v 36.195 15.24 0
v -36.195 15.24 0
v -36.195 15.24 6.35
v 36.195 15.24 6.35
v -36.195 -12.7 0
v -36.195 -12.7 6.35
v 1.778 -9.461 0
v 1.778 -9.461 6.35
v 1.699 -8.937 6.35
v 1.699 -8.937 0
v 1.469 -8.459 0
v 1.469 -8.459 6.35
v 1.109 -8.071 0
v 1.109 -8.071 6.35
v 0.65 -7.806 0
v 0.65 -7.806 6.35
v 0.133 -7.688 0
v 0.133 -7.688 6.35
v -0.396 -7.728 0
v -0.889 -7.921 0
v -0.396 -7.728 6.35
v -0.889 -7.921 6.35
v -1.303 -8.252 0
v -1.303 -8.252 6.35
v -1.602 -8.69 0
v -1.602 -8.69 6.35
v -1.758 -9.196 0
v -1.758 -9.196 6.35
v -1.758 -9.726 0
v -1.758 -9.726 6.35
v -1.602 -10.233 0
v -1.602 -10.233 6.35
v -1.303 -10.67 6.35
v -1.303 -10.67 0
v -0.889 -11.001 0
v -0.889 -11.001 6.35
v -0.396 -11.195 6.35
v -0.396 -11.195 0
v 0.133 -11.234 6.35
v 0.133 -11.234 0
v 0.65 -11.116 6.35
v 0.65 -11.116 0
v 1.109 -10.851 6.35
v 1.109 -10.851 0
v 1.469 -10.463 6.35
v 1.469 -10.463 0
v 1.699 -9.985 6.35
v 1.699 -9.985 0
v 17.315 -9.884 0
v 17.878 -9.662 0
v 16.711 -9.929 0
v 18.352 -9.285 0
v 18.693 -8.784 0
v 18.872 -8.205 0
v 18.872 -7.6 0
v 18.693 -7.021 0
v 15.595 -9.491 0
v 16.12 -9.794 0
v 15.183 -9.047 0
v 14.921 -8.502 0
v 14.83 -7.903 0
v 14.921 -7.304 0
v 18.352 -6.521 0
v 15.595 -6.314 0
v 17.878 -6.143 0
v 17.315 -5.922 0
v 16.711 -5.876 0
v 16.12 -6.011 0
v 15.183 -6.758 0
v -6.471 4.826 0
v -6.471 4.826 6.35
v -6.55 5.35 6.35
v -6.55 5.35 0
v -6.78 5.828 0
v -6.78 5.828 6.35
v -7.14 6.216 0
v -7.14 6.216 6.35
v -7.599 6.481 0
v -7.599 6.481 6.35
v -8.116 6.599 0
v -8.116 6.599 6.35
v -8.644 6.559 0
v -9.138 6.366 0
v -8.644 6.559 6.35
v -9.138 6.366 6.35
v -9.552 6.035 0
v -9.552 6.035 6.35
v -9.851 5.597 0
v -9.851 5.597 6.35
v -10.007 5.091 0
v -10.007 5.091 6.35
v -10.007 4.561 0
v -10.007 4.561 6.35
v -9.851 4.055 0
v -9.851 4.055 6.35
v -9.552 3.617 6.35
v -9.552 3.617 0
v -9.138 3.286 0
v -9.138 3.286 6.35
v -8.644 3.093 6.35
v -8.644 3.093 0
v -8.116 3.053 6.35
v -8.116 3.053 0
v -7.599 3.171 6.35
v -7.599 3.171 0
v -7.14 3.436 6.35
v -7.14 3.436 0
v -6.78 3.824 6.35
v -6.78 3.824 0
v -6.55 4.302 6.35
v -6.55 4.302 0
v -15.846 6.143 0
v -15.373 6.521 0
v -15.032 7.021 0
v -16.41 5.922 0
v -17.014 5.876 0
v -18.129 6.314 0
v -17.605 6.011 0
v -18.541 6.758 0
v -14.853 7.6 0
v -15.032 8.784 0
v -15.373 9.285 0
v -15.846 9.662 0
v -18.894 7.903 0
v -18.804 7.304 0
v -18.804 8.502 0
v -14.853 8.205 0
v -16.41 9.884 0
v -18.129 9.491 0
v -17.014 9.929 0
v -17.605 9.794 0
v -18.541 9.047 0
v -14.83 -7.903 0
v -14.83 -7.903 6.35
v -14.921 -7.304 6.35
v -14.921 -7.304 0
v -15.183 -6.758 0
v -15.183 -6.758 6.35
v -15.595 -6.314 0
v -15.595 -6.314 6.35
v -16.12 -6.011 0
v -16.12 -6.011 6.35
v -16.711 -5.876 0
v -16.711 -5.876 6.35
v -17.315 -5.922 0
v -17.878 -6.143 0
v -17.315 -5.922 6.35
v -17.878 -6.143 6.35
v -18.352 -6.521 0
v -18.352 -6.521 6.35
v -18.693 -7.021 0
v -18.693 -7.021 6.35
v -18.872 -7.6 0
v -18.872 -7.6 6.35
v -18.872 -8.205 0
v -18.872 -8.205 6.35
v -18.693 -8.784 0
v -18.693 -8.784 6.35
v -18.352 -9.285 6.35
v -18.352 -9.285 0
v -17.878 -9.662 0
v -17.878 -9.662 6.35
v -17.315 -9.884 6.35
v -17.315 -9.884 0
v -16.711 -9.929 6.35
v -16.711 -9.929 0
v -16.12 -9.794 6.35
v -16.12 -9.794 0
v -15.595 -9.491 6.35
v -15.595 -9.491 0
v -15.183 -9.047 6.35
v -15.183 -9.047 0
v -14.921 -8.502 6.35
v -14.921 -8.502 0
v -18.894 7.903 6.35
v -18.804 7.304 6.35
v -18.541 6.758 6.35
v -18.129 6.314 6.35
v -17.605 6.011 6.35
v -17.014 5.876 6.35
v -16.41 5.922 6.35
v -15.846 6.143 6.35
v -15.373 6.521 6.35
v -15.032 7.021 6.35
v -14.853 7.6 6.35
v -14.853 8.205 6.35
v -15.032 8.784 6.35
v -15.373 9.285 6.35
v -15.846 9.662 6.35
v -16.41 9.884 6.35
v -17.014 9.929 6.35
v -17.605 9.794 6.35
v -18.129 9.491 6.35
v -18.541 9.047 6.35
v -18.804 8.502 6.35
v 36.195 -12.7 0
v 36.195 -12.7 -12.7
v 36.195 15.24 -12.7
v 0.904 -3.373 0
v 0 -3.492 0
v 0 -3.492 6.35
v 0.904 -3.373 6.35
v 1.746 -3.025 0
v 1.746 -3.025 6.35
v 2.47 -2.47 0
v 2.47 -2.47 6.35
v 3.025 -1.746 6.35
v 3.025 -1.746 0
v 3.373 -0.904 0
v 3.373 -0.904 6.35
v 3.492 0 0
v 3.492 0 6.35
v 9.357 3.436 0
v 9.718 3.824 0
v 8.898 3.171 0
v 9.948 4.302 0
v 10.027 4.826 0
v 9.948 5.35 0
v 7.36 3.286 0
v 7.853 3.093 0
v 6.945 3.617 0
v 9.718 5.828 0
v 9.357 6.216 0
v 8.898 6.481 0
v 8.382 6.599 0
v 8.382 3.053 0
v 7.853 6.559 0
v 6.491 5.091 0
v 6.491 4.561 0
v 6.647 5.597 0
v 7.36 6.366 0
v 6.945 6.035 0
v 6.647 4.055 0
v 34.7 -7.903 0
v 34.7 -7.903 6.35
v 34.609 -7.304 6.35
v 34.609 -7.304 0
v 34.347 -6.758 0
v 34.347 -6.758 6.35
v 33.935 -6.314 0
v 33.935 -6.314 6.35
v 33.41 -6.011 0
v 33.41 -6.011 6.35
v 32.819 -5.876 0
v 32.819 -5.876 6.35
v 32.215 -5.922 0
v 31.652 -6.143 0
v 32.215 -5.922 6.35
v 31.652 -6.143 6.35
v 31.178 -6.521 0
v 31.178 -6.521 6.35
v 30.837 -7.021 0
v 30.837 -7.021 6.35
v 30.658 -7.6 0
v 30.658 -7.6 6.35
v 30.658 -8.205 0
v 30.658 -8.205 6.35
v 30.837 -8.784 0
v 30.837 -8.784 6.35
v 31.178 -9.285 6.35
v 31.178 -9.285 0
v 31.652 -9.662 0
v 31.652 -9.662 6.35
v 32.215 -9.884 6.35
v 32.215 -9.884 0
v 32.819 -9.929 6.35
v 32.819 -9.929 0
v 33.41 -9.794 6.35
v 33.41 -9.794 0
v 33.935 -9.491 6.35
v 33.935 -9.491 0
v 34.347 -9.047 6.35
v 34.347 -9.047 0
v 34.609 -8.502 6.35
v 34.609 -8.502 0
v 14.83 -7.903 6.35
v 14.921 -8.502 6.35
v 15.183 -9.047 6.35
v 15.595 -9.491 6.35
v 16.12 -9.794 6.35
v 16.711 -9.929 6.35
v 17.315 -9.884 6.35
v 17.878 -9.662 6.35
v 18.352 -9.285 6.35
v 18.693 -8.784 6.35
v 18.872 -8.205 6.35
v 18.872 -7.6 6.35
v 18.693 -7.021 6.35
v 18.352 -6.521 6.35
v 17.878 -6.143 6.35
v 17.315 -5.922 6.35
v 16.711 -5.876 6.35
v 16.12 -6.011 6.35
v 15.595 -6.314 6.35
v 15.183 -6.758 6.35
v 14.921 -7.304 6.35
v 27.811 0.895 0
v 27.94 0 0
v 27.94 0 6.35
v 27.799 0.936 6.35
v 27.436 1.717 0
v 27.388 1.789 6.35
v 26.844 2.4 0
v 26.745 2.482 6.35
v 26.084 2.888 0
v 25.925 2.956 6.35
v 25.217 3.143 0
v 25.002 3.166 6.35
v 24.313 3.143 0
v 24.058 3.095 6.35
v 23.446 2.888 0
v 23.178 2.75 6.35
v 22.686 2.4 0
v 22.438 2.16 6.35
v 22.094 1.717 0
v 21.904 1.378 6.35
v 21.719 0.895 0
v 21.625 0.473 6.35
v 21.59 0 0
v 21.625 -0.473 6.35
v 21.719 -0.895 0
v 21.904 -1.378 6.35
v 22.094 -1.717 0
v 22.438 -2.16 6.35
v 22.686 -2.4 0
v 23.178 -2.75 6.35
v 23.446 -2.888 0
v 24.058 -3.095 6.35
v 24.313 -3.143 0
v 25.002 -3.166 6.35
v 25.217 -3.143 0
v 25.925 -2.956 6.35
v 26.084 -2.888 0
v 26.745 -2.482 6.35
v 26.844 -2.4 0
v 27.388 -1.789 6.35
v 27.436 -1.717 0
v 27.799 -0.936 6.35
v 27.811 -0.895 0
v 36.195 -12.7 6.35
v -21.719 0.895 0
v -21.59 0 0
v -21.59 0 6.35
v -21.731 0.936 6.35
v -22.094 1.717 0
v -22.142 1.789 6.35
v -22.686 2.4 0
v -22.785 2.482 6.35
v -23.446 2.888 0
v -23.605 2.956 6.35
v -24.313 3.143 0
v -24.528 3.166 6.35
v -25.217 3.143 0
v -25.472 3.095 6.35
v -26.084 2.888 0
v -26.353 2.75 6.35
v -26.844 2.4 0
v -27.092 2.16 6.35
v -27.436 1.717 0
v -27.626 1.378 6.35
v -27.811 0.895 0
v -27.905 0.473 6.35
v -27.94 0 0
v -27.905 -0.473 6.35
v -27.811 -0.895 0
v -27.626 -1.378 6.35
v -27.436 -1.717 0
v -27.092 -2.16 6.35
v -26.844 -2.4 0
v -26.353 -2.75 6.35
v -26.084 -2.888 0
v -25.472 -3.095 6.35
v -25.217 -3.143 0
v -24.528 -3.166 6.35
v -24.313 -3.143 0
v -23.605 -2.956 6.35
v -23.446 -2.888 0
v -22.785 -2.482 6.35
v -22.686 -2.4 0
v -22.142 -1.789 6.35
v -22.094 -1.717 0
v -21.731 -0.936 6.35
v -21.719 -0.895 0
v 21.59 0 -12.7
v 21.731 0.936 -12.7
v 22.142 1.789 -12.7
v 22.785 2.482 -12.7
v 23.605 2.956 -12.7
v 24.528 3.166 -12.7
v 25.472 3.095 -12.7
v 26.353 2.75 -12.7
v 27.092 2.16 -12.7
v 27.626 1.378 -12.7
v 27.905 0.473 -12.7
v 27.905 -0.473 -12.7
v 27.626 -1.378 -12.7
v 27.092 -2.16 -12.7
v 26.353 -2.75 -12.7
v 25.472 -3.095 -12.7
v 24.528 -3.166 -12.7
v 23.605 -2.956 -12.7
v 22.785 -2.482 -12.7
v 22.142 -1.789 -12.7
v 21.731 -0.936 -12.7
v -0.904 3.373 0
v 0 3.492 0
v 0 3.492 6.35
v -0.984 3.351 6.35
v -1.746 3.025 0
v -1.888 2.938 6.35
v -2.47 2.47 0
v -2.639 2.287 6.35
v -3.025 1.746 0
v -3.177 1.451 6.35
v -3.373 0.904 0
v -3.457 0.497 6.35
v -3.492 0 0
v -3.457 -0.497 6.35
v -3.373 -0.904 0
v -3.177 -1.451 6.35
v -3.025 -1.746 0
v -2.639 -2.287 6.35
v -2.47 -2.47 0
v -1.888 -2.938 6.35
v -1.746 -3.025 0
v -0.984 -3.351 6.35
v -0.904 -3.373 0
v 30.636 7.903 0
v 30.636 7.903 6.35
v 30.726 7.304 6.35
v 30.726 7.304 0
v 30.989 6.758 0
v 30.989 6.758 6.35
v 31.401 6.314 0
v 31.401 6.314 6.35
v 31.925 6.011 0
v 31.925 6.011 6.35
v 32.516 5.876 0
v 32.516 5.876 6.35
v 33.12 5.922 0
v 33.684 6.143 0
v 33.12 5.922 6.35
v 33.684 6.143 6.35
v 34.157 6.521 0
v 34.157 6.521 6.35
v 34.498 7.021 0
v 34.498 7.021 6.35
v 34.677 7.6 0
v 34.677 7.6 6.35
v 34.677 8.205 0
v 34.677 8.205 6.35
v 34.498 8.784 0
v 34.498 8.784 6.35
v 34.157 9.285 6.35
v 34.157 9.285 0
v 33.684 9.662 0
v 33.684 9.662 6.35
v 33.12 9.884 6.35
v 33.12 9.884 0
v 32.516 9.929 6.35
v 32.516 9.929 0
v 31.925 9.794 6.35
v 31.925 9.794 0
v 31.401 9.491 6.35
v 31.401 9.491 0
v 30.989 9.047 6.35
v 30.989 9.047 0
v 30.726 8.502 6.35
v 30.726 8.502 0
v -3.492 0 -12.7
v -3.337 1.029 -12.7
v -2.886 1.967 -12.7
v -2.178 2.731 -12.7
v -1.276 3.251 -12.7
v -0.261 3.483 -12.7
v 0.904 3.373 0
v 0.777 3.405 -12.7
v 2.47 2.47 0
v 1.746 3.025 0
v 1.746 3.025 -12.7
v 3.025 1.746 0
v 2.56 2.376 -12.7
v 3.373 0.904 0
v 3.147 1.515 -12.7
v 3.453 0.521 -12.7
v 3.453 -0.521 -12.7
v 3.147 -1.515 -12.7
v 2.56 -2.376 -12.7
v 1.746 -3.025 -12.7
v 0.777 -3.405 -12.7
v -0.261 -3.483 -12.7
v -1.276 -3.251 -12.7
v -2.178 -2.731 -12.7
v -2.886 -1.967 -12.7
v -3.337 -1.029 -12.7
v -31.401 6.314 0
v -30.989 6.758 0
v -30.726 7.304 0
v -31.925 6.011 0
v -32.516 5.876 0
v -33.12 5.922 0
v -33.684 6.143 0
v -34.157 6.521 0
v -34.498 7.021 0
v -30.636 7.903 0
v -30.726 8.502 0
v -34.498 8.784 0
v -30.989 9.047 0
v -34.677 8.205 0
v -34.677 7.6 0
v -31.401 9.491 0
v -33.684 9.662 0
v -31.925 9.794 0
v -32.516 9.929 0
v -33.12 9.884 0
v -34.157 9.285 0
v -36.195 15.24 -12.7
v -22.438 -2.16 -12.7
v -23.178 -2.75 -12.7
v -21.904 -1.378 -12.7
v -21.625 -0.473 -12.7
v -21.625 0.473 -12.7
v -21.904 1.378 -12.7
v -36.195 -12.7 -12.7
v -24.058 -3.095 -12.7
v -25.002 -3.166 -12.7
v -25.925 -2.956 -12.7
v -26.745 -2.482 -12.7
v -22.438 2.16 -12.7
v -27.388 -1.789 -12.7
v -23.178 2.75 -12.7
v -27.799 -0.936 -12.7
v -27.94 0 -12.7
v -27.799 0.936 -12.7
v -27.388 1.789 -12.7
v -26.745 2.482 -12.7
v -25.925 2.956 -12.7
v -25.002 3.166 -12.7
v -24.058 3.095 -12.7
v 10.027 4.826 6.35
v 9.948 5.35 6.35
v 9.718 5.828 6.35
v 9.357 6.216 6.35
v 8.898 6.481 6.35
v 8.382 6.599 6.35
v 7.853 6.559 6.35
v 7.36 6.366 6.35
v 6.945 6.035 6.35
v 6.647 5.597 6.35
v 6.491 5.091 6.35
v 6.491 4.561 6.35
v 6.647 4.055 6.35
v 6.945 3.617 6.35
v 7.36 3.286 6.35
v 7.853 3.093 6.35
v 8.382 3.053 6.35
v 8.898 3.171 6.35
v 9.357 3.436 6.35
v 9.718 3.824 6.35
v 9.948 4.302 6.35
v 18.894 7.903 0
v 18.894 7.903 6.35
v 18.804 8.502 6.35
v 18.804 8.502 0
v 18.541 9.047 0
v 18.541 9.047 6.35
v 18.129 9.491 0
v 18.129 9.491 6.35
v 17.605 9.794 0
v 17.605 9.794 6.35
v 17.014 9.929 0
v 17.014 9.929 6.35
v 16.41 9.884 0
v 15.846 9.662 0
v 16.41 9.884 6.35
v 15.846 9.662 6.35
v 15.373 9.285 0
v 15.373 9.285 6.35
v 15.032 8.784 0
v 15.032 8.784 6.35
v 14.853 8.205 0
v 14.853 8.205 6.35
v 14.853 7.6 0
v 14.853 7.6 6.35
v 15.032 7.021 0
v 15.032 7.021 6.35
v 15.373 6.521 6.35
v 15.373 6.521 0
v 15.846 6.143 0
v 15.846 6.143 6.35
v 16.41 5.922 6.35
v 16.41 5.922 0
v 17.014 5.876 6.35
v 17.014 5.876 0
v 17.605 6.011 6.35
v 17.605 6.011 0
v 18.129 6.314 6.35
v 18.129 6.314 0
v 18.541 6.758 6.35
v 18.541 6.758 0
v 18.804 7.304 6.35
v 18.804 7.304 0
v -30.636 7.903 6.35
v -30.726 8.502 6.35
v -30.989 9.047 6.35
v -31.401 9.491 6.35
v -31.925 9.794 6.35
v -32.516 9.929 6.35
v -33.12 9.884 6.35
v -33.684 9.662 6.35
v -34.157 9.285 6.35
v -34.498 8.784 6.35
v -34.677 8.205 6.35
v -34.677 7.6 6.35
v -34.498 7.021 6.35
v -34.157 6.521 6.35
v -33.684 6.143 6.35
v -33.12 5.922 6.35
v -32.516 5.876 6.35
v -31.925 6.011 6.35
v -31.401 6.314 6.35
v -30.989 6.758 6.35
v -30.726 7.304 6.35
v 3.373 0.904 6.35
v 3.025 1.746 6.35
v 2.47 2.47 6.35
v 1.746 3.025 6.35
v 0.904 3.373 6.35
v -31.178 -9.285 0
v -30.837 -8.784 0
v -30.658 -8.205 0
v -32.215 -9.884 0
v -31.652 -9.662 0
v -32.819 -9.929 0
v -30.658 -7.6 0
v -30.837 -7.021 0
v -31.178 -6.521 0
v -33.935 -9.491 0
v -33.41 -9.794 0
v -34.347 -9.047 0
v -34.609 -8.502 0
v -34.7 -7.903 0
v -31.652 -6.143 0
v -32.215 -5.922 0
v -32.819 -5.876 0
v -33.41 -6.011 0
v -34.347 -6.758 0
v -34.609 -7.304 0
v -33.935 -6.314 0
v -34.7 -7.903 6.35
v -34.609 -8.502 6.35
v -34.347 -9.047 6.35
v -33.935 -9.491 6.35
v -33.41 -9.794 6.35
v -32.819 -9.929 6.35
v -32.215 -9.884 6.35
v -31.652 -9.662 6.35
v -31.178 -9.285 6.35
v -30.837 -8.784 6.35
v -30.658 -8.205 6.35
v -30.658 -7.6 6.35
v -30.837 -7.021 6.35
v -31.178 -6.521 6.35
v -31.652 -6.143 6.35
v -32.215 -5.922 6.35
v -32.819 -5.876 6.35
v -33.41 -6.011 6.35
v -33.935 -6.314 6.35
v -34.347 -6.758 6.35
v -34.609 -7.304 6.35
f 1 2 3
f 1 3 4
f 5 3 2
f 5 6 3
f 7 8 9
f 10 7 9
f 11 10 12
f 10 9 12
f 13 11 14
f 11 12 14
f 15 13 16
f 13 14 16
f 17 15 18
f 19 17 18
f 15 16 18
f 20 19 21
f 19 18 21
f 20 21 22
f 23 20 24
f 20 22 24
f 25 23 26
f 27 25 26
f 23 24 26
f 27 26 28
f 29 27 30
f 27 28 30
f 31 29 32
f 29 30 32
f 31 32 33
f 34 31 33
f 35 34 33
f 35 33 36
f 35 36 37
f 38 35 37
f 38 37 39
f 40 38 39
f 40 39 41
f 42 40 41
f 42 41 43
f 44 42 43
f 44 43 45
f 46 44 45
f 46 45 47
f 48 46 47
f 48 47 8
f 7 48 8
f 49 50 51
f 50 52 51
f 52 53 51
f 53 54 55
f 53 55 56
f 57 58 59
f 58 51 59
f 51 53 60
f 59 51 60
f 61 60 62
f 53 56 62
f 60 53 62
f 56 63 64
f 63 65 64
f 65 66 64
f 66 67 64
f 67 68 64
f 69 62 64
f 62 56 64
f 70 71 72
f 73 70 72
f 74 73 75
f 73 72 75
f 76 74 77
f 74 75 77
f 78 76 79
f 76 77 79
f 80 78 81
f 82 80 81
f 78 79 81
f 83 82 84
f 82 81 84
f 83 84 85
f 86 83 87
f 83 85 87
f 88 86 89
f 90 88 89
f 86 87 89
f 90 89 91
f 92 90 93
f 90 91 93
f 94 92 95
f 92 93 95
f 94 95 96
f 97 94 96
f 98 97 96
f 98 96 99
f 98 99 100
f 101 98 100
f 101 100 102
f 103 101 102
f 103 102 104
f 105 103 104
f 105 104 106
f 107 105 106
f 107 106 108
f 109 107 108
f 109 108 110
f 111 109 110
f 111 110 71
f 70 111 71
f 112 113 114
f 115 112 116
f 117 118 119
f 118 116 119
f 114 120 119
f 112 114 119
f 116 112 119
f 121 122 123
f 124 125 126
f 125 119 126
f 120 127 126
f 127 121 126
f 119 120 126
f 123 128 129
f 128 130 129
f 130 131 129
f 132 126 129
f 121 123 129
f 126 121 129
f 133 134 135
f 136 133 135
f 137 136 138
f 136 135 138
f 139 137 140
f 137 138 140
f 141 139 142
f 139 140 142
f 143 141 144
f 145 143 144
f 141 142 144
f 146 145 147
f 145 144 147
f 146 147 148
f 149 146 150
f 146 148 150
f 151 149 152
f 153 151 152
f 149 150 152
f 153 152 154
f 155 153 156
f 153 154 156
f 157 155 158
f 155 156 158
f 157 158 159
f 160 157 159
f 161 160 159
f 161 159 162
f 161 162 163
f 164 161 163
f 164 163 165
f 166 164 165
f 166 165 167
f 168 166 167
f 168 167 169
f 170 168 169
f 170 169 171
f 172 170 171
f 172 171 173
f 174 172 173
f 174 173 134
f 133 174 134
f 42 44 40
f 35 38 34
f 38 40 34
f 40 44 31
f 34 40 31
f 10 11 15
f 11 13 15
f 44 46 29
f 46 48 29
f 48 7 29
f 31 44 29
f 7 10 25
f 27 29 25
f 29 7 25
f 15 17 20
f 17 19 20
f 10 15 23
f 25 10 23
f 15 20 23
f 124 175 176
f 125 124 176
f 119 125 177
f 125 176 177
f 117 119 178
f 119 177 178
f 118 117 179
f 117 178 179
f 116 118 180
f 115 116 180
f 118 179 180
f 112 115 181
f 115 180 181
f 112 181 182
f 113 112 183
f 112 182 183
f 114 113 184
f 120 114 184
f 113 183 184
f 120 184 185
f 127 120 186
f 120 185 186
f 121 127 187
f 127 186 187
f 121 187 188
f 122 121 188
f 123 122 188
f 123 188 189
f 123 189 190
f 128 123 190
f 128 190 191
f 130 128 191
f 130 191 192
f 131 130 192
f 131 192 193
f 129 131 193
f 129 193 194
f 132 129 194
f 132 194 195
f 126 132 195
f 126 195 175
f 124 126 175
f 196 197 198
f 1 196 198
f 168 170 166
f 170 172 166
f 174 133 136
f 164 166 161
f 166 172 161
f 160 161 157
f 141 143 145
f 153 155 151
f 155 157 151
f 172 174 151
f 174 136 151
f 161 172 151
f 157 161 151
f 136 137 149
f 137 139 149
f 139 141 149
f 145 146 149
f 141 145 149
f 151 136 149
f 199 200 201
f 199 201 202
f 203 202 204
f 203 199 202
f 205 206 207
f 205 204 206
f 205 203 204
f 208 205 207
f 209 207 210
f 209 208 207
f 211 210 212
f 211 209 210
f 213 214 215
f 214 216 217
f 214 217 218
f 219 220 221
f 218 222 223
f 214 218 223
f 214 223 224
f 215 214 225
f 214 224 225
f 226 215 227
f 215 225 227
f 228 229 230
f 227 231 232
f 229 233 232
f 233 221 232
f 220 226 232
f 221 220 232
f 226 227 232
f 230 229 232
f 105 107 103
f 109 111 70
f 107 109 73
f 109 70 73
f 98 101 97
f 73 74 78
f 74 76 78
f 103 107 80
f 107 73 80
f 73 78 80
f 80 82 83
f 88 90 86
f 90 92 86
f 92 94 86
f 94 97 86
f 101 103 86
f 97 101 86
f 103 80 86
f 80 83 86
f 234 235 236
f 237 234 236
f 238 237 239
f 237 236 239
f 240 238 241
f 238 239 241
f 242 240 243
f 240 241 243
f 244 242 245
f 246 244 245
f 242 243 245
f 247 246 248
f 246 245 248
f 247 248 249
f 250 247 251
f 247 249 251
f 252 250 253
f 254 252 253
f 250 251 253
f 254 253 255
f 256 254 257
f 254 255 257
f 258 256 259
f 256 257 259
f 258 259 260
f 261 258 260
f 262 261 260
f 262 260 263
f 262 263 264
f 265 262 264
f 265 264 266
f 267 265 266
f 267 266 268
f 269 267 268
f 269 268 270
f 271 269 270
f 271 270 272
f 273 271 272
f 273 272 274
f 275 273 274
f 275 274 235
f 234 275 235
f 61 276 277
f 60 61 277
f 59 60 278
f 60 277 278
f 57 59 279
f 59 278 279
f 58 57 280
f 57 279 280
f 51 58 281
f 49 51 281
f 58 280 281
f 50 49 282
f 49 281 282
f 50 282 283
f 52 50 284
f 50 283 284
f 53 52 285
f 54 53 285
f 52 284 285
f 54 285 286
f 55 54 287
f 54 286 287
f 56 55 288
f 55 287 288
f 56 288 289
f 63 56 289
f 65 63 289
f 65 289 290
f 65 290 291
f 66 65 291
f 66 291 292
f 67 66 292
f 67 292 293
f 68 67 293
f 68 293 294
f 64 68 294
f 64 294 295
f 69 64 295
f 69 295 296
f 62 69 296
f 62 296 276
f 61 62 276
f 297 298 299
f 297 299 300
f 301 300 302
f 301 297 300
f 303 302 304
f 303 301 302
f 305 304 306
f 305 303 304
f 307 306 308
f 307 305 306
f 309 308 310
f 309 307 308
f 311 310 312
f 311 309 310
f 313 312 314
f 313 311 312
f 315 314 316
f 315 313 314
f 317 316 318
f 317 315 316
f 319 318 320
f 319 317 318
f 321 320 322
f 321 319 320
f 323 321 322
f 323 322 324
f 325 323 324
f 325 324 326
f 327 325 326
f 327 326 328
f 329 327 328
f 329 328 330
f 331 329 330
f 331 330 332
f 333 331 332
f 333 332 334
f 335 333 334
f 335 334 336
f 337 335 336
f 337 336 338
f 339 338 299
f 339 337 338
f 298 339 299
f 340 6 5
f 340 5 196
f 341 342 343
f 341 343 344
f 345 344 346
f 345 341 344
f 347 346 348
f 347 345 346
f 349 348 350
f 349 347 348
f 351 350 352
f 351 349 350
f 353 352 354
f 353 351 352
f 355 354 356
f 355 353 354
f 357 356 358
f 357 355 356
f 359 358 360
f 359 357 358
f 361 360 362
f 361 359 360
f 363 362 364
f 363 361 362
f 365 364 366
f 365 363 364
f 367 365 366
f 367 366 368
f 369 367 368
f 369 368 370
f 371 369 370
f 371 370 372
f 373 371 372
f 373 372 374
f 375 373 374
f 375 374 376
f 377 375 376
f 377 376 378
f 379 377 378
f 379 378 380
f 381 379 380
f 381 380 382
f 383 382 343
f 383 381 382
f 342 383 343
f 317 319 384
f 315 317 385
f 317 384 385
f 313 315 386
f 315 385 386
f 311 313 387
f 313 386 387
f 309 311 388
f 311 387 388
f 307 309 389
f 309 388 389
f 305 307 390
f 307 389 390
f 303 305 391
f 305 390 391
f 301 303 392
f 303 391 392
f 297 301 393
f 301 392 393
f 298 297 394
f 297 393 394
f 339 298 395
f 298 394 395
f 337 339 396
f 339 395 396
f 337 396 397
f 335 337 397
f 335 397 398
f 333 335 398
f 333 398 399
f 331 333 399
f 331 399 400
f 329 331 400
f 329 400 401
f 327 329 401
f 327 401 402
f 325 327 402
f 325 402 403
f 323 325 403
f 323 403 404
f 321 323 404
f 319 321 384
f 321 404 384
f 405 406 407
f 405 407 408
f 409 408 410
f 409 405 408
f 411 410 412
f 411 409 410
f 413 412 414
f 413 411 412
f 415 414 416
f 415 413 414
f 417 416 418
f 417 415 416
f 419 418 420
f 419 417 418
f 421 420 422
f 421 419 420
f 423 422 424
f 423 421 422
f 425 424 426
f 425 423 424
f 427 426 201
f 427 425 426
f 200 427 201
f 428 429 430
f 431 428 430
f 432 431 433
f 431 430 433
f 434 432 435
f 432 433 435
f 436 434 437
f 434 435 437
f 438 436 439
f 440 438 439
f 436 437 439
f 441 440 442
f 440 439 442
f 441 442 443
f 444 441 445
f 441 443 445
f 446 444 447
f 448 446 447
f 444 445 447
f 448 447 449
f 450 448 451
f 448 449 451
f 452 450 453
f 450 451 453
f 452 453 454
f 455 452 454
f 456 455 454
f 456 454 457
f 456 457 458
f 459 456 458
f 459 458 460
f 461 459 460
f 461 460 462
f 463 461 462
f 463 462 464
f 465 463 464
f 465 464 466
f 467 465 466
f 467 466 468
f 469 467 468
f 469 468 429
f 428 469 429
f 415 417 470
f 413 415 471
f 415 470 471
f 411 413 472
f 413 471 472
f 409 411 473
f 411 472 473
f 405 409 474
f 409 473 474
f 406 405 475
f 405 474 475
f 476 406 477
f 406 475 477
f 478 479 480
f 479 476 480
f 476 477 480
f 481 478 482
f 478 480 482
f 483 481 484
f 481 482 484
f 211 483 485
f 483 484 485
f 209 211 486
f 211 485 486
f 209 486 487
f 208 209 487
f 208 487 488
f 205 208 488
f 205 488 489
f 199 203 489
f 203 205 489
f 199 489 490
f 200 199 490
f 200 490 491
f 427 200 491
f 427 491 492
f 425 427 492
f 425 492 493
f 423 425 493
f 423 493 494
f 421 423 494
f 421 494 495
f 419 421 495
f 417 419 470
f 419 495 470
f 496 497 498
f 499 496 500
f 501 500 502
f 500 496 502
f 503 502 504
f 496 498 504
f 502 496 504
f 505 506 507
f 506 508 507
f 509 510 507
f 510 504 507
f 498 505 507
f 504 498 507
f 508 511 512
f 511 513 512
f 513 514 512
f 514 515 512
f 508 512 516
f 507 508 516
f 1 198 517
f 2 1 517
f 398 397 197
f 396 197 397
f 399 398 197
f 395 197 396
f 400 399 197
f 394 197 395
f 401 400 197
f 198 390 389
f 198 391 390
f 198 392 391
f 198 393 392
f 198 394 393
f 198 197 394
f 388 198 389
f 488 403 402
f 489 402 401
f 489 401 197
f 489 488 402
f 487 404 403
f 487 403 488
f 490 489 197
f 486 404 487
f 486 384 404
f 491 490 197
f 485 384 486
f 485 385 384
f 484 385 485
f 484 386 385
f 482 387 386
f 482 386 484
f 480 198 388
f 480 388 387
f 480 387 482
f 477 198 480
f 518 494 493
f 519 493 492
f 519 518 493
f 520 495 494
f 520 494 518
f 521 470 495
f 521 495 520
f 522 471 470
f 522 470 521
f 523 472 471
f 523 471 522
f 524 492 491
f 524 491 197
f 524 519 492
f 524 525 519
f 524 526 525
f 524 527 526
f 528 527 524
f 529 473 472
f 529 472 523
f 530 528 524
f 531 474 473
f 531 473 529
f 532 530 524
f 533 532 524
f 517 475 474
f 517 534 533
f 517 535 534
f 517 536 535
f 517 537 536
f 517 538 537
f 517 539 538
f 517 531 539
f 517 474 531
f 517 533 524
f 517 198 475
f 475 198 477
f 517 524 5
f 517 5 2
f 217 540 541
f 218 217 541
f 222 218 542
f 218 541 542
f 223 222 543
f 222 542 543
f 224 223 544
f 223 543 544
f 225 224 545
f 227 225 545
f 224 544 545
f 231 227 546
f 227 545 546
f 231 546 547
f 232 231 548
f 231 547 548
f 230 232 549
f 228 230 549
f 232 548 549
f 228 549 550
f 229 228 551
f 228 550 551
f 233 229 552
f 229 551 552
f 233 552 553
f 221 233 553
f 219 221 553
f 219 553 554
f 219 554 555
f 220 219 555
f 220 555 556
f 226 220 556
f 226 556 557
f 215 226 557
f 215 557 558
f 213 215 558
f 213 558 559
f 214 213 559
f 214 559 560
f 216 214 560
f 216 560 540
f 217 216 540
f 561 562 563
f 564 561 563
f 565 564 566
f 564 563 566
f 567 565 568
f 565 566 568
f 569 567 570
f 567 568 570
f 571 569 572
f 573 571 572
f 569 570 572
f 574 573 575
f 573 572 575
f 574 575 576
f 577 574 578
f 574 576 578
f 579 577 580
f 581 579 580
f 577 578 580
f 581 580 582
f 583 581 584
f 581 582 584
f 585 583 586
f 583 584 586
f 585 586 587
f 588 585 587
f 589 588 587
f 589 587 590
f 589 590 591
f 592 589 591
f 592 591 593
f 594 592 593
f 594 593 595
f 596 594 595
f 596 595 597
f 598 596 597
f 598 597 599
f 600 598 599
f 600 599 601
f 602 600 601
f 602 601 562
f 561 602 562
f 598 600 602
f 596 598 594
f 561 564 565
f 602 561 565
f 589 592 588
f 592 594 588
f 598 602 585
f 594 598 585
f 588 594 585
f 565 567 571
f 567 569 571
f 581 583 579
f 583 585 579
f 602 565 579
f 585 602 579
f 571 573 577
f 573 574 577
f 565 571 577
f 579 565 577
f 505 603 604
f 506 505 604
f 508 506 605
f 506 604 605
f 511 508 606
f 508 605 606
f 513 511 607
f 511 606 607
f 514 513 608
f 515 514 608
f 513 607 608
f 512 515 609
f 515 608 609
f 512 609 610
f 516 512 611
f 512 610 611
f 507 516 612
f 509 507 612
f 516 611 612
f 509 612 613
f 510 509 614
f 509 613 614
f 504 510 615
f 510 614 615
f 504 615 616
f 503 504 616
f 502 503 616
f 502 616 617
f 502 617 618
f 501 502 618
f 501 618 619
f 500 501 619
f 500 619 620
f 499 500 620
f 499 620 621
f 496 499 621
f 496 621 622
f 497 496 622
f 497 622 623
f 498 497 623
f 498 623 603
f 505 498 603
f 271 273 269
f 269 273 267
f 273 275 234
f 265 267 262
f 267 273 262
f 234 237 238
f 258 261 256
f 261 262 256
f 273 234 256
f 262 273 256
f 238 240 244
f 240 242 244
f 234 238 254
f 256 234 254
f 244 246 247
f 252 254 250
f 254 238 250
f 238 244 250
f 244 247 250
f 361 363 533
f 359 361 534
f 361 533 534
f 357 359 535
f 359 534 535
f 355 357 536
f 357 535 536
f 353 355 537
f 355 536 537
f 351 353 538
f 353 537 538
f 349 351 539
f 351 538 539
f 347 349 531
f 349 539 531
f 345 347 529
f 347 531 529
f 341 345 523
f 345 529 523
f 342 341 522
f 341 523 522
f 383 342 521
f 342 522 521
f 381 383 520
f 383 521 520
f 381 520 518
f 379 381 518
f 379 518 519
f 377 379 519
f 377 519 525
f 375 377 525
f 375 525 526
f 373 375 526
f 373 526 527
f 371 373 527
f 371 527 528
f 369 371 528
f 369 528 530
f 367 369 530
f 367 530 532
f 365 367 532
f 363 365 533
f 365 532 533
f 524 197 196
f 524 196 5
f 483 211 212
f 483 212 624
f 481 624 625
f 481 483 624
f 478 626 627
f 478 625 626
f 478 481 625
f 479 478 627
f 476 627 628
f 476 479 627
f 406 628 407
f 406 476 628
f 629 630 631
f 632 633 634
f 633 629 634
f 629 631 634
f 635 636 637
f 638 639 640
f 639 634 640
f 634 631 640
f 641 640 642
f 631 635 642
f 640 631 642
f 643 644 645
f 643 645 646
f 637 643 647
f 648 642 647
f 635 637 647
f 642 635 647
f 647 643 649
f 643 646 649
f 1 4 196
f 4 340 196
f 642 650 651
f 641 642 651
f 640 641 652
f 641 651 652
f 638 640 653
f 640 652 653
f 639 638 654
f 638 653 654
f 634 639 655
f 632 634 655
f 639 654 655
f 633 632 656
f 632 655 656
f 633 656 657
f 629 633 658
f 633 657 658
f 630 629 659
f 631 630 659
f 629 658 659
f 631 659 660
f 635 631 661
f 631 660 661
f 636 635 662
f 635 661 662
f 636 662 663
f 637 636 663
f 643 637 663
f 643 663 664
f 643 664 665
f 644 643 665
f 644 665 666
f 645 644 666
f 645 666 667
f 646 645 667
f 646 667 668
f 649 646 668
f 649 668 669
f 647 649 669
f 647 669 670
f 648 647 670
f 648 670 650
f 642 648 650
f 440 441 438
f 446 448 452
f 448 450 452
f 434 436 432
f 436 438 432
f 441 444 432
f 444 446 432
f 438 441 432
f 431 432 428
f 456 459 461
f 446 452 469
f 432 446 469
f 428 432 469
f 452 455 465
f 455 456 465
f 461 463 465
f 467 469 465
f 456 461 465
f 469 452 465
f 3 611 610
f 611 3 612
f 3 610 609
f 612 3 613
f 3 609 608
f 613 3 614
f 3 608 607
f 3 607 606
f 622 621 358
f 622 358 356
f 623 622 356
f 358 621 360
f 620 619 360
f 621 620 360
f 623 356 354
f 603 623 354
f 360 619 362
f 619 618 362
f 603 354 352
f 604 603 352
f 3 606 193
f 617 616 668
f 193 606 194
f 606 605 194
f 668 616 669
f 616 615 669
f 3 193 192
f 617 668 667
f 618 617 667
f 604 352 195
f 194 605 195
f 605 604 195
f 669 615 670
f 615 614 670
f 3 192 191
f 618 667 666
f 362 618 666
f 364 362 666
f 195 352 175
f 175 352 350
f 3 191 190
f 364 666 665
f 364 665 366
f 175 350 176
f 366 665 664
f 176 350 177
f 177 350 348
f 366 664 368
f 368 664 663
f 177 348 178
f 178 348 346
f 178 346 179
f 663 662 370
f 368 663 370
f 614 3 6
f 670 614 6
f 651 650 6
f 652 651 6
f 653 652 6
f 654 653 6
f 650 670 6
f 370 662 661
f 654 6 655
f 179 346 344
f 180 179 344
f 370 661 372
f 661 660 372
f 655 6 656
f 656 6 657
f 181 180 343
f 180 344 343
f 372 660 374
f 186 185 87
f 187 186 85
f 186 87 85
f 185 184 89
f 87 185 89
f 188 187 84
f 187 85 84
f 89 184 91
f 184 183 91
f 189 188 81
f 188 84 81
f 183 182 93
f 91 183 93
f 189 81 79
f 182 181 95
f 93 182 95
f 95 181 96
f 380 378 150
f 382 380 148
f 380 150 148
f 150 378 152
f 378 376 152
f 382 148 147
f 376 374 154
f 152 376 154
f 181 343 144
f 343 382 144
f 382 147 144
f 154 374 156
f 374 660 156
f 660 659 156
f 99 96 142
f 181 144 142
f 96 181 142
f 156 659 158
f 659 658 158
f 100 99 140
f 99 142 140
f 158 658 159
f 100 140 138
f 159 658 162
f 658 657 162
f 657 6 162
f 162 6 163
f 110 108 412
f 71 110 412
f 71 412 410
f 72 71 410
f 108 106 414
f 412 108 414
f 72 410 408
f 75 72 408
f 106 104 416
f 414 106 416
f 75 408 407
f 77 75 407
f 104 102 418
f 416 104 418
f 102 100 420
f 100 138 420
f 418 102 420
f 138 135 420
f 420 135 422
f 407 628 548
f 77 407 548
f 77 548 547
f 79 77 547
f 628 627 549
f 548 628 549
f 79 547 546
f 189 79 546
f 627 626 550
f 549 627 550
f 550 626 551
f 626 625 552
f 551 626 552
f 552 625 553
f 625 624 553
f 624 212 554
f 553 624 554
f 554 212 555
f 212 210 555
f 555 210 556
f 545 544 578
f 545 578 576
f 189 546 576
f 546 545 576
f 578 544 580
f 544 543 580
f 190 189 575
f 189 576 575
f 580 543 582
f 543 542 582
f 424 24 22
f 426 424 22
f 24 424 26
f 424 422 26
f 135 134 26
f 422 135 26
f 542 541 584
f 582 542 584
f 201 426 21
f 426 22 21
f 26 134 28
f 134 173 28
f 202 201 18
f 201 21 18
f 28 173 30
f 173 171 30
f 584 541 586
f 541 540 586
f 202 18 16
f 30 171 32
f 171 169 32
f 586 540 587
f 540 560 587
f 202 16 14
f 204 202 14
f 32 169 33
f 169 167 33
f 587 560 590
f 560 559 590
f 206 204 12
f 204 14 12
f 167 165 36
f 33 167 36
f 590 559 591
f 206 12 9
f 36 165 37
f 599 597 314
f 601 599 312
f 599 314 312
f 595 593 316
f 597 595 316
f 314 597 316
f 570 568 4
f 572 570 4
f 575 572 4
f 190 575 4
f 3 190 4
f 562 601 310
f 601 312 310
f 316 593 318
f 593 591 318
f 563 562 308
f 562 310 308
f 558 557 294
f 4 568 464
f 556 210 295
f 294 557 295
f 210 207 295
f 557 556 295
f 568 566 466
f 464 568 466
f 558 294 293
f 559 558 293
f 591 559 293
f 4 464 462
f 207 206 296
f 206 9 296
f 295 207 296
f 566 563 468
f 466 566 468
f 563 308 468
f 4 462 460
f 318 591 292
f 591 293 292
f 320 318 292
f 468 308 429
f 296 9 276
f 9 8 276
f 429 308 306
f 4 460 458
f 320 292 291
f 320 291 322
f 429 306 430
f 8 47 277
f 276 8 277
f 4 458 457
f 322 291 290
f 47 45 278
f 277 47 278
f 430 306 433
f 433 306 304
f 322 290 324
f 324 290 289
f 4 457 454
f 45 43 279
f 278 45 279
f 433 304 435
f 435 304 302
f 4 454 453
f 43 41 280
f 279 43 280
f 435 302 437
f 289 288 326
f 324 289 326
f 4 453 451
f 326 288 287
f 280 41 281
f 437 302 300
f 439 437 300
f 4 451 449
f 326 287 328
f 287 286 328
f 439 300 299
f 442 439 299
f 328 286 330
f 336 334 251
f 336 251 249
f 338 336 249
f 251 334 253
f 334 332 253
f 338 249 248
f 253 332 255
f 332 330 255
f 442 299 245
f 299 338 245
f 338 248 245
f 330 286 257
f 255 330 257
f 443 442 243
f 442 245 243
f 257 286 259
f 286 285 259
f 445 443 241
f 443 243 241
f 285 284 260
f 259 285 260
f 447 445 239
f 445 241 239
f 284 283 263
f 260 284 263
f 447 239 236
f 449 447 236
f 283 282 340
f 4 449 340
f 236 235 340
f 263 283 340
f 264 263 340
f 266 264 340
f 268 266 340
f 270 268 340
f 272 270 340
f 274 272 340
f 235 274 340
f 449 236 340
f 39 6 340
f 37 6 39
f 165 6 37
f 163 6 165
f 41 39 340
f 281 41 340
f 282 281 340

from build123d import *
from build123d.topology import SkipClean

# Parameters (mm, degrees)
SKETCH1_W           = 72.39
SKETCH1_H           = 22.86
BOSS_EXTRUDE1_DEPTH = 6.35
SKETCH1_3_R         = 3.4925
SKETCH1_3_R_2       = 3.175
CUT_EXTRUDE3_DEPTH  = 12.7
SKETCH2_R           = 2.032
CUT_EXTRUDE4_DEPTH  = 39.484352989
SKETCH3_R           = 1.778
CUT_EXTRUDE5_DEPTH  = 39.484352989
SKETCH4_W           = 72.39
SKETCH4_H           = 6.35
BOSS_EXTRUDE2_DEPTH = 1.27
SKETCH5_W           = 72.39
SKETCH5_H           = 6.35
BOSS_EXTRUDE3_DEPTH = 3.81
BOSS_EXTRUDE4_START = 12.7
SKETCH7_W           = 72.39
SKETCH7_H           = 27.94
SKETCH7_R           = 3.175
SKETCH7_R_2         = 3.4925
BOSS_EXTRUDE4_DEPTH = 12.7


with BuildPart() as part:
    # Sketch1 → Boss-Extrude1 (new body)
    with BuildSketch(Plane.XY):
        Rectangle(SKETCH1_W, SKETCH1_H)
    extrude(amount=BOSS_EXTRUDE1_DEPTH)

    # Sketch1<3> → Cut-Extrude3 (cut)
    with BuildSketch(Plane.XY):
        Circle(SKETCH1_3_R)
        with Locations((-24.765, 0)):
            Circle(SKETCH1_3_R_2)
        with Locations((24.765, 0)):
            Circle(SKETCH1_3_R_2)
    extrude(amount=CUT_EXTRUDE3_DEPTH, mode=Mode.SUBTRACT)

    # Sketch2 → Cut-Extrude4 (cut, through all)
    with BuildSketch(Plane.XY.offset(6.35)):
        with Locations((32.667625387, -7.902625387)):
            Circle(SKETCH2_R)
        with Locations((32.667625387, 7.902625387)):
            Circle(SKETCH2_R)
        with Locations((16.862374613, 7.902625387)):
            Circle(SKETCH2_R)
        with Locations((16.862374613, -7.902625387)):
            Circle(SKETCH2_R)
        with Locations((-16.862374613, 7.902625387)):
            Circle(SKETCH2_R)
        with Locations((-32.667625387, 7.902625387)):
            Circle(SKETCH2_R)
        with Locations((-16.862374613, -7.902625387)):
            Circle(SKETCH2_R)
        with Locations((-32.667625387, -7.902625387)):
            Circle(SKETCH2_R)
    extrude(amount=-CUT_EXTRUDE4_DEPTH, mode=Mode.SUBTRACT)

    # Sketch3 → Cut-Extrude5 (cut, through all)
    with BuildSketch(Plane.XY.offset(6.35)):
        with Locations((8.24865, 4.826)):
            Circle(SKETCH3_R)
        with Locations((-8.24865, 4.826)):
            Circle(SKETCH3_R)
        with Locations((0, -9.461080894)):
            Circle(SKETCH3_R)
    extrude(amount=-CUT_EXTRUDE5_DEPTH, mode=Mode.SUBTRACT)

    # Sketch4 → Boss-Extrude2 (add)
    with BuildSketch(Plane.XZ.offset(11.43)):
        with Locations((0, 3.175)):
            Rectangle(SKETCH4_W, SKETCH4_H)
    extrude(amount=BOSS_EXTRUDE2_DEPTH)

    # Sketch5 → Boss-Extrude3 (add)
    with BuildSketch(Plane(origin=(0, 11.43, 0), x_dir=(1, 0, 0), z_dir=(0, 1, 0))):
        with Locations((0, -3.175)):
            Rectangle(SKETCH5_W, SKETCH5_H)
    extrude(amount=BOSS_EXTRUDE3_DEPTH)

    # Sketch7 → Boss-Extrude4 (add)
    with SkipClean():  # the faces are left unmerged after this step: merging them gives an invalid solid
        with BuildSketch(Plane(origin=(0, 0, 0), x_dir=(-1, 0, 0), z_dir=(0, 0, -1)).offset(BOSS_EXTRUDE4_START)):
            with Locations((0, 1.27)):
                Rectangle(SKETCH7_W, SKETCH7_H)
            with Locations((-24.765, 0)):
                Circle(SKETCH7_R, mode=Mode.SUBTRACT)
            Circle(SKETCH7_R_2, mode=Mode.SUBTRACT)
            with Locations((24.765, 0)):
                Circle(SKETCH7_R, mode=Mode.SUBTRACT)
        extrude(amount=-BOSS_EXTRUDE4_DEPTH)


solid = part.part
